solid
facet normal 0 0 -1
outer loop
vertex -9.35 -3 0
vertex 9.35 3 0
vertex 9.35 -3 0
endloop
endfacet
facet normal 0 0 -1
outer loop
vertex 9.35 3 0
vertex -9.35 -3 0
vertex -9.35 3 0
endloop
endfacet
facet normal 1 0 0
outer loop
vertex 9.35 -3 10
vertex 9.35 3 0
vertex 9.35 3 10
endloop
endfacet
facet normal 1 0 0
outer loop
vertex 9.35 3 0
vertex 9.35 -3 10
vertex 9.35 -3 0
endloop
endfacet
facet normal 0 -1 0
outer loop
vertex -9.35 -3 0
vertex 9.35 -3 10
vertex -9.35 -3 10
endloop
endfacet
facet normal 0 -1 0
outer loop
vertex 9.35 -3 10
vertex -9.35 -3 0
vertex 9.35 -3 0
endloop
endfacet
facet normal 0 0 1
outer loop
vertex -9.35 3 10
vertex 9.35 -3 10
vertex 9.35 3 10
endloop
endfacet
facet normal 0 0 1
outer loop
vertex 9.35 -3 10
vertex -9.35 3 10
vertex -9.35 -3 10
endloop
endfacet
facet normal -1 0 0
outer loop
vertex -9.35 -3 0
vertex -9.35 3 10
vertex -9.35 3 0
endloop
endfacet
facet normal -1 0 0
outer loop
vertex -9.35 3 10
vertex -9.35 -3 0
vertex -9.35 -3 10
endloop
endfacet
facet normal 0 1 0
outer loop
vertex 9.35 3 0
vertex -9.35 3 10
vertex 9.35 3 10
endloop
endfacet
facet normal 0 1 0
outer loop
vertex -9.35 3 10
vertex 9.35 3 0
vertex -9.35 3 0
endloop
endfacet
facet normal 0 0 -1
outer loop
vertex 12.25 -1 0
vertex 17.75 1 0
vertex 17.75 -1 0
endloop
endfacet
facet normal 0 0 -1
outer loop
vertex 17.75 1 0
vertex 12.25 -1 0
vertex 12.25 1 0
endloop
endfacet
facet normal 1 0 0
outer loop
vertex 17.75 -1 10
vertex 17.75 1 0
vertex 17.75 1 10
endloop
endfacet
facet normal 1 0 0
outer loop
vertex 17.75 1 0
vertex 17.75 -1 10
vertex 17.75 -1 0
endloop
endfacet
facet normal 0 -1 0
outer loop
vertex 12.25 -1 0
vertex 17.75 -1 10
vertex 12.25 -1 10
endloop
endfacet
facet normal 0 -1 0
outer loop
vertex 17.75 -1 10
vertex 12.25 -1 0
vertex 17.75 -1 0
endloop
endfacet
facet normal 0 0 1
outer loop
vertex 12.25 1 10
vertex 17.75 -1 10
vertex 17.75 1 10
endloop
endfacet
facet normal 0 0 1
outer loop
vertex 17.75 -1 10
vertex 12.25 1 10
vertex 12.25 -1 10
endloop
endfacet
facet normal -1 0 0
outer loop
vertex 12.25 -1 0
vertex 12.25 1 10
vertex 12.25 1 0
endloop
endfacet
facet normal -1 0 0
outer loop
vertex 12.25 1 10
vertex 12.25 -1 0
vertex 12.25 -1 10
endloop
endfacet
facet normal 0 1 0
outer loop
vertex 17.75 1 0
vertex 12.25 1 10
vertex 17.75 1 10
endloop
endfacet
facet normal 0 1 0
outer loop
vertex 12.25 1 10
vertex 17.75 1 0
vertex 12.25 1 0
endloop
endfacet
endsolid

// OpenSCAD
// Built by bench/smallmodels/features/compiler.py from a list of features.
$fn = 64;
union() {
    translate([0, 0, 0]) linear_extrude(height = 10) polygon([[-9.35, -3], [9.35, -3], [9.35, 3], [-9.35, 3]]);
    translate([15, 0, 0]) linear_extrude(height = 10) polygon([[-2.75, -1], [2.75, -1], [2.75, 1], [-2.75, 1]]);
  }
